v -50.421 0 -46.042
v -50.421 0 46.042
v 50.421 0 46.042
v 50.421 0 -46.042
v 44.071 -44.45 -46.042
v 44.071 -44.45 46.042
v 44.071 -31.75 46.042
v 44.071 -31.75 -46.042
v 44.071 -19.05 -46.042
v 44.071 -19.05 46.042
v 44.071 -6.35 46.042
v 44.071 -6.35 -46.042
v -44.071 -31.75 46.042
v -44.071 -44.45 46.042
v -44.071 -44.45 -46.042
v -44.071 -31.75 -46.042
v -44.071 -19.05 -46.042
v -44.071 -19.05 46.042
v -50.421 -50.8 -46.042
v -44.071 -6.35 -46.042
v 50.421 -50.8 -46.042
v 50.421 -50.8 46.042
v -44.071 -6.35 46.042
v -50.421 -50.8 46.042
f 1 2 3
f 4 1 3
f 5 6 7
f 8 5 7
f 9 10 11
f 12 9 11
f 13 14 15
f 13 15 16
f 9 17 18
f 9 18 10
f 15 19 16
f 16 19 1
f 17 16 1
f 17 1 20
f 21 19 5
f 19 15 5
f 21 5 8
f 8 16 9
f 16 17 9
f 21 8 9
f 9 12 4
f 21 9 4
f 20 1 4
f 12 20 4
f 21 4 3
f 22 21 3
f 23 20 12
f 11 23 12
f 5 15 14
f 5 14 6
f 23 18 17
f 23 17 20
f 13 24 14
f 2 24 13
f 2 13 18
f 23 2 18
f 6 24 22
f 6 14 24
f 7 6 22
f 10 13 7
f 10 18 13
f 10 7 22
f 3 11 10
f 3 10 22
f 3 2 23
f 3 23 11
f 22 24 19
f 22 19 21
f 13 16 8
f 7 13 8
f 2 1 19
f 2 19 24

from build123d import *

# Parameters (mm, degrees)
F0_W     = 100.84179
F0_H     = 92.084482
F1_DEPTH = 50.8
F2_W     = 88.14179
F2_H     = 12.7
F3_DEPTH = 101.6


with BuildPart() as f1:
    # F0 (on Front) → F1 (new body)
    with BuildSketch(Plane.XZ):
        Rectangle(F0_W, F0_H)
    extrude(amount=F1_DEPTH)

    # F2 (on face) → F3 (cut)
    with BuildSketch(Plane.XY.offset(46.042241)):
        with Locations((0, -12.7)):
            Rectangle(F2_W, F2_H)
        with Locations((0, -38.1)):
            Rectangle(F2_W, F2_H)
    extrude(amount=-F3_DEPTH, mode=Mode.SUBTRACT)


solid = f1.part
